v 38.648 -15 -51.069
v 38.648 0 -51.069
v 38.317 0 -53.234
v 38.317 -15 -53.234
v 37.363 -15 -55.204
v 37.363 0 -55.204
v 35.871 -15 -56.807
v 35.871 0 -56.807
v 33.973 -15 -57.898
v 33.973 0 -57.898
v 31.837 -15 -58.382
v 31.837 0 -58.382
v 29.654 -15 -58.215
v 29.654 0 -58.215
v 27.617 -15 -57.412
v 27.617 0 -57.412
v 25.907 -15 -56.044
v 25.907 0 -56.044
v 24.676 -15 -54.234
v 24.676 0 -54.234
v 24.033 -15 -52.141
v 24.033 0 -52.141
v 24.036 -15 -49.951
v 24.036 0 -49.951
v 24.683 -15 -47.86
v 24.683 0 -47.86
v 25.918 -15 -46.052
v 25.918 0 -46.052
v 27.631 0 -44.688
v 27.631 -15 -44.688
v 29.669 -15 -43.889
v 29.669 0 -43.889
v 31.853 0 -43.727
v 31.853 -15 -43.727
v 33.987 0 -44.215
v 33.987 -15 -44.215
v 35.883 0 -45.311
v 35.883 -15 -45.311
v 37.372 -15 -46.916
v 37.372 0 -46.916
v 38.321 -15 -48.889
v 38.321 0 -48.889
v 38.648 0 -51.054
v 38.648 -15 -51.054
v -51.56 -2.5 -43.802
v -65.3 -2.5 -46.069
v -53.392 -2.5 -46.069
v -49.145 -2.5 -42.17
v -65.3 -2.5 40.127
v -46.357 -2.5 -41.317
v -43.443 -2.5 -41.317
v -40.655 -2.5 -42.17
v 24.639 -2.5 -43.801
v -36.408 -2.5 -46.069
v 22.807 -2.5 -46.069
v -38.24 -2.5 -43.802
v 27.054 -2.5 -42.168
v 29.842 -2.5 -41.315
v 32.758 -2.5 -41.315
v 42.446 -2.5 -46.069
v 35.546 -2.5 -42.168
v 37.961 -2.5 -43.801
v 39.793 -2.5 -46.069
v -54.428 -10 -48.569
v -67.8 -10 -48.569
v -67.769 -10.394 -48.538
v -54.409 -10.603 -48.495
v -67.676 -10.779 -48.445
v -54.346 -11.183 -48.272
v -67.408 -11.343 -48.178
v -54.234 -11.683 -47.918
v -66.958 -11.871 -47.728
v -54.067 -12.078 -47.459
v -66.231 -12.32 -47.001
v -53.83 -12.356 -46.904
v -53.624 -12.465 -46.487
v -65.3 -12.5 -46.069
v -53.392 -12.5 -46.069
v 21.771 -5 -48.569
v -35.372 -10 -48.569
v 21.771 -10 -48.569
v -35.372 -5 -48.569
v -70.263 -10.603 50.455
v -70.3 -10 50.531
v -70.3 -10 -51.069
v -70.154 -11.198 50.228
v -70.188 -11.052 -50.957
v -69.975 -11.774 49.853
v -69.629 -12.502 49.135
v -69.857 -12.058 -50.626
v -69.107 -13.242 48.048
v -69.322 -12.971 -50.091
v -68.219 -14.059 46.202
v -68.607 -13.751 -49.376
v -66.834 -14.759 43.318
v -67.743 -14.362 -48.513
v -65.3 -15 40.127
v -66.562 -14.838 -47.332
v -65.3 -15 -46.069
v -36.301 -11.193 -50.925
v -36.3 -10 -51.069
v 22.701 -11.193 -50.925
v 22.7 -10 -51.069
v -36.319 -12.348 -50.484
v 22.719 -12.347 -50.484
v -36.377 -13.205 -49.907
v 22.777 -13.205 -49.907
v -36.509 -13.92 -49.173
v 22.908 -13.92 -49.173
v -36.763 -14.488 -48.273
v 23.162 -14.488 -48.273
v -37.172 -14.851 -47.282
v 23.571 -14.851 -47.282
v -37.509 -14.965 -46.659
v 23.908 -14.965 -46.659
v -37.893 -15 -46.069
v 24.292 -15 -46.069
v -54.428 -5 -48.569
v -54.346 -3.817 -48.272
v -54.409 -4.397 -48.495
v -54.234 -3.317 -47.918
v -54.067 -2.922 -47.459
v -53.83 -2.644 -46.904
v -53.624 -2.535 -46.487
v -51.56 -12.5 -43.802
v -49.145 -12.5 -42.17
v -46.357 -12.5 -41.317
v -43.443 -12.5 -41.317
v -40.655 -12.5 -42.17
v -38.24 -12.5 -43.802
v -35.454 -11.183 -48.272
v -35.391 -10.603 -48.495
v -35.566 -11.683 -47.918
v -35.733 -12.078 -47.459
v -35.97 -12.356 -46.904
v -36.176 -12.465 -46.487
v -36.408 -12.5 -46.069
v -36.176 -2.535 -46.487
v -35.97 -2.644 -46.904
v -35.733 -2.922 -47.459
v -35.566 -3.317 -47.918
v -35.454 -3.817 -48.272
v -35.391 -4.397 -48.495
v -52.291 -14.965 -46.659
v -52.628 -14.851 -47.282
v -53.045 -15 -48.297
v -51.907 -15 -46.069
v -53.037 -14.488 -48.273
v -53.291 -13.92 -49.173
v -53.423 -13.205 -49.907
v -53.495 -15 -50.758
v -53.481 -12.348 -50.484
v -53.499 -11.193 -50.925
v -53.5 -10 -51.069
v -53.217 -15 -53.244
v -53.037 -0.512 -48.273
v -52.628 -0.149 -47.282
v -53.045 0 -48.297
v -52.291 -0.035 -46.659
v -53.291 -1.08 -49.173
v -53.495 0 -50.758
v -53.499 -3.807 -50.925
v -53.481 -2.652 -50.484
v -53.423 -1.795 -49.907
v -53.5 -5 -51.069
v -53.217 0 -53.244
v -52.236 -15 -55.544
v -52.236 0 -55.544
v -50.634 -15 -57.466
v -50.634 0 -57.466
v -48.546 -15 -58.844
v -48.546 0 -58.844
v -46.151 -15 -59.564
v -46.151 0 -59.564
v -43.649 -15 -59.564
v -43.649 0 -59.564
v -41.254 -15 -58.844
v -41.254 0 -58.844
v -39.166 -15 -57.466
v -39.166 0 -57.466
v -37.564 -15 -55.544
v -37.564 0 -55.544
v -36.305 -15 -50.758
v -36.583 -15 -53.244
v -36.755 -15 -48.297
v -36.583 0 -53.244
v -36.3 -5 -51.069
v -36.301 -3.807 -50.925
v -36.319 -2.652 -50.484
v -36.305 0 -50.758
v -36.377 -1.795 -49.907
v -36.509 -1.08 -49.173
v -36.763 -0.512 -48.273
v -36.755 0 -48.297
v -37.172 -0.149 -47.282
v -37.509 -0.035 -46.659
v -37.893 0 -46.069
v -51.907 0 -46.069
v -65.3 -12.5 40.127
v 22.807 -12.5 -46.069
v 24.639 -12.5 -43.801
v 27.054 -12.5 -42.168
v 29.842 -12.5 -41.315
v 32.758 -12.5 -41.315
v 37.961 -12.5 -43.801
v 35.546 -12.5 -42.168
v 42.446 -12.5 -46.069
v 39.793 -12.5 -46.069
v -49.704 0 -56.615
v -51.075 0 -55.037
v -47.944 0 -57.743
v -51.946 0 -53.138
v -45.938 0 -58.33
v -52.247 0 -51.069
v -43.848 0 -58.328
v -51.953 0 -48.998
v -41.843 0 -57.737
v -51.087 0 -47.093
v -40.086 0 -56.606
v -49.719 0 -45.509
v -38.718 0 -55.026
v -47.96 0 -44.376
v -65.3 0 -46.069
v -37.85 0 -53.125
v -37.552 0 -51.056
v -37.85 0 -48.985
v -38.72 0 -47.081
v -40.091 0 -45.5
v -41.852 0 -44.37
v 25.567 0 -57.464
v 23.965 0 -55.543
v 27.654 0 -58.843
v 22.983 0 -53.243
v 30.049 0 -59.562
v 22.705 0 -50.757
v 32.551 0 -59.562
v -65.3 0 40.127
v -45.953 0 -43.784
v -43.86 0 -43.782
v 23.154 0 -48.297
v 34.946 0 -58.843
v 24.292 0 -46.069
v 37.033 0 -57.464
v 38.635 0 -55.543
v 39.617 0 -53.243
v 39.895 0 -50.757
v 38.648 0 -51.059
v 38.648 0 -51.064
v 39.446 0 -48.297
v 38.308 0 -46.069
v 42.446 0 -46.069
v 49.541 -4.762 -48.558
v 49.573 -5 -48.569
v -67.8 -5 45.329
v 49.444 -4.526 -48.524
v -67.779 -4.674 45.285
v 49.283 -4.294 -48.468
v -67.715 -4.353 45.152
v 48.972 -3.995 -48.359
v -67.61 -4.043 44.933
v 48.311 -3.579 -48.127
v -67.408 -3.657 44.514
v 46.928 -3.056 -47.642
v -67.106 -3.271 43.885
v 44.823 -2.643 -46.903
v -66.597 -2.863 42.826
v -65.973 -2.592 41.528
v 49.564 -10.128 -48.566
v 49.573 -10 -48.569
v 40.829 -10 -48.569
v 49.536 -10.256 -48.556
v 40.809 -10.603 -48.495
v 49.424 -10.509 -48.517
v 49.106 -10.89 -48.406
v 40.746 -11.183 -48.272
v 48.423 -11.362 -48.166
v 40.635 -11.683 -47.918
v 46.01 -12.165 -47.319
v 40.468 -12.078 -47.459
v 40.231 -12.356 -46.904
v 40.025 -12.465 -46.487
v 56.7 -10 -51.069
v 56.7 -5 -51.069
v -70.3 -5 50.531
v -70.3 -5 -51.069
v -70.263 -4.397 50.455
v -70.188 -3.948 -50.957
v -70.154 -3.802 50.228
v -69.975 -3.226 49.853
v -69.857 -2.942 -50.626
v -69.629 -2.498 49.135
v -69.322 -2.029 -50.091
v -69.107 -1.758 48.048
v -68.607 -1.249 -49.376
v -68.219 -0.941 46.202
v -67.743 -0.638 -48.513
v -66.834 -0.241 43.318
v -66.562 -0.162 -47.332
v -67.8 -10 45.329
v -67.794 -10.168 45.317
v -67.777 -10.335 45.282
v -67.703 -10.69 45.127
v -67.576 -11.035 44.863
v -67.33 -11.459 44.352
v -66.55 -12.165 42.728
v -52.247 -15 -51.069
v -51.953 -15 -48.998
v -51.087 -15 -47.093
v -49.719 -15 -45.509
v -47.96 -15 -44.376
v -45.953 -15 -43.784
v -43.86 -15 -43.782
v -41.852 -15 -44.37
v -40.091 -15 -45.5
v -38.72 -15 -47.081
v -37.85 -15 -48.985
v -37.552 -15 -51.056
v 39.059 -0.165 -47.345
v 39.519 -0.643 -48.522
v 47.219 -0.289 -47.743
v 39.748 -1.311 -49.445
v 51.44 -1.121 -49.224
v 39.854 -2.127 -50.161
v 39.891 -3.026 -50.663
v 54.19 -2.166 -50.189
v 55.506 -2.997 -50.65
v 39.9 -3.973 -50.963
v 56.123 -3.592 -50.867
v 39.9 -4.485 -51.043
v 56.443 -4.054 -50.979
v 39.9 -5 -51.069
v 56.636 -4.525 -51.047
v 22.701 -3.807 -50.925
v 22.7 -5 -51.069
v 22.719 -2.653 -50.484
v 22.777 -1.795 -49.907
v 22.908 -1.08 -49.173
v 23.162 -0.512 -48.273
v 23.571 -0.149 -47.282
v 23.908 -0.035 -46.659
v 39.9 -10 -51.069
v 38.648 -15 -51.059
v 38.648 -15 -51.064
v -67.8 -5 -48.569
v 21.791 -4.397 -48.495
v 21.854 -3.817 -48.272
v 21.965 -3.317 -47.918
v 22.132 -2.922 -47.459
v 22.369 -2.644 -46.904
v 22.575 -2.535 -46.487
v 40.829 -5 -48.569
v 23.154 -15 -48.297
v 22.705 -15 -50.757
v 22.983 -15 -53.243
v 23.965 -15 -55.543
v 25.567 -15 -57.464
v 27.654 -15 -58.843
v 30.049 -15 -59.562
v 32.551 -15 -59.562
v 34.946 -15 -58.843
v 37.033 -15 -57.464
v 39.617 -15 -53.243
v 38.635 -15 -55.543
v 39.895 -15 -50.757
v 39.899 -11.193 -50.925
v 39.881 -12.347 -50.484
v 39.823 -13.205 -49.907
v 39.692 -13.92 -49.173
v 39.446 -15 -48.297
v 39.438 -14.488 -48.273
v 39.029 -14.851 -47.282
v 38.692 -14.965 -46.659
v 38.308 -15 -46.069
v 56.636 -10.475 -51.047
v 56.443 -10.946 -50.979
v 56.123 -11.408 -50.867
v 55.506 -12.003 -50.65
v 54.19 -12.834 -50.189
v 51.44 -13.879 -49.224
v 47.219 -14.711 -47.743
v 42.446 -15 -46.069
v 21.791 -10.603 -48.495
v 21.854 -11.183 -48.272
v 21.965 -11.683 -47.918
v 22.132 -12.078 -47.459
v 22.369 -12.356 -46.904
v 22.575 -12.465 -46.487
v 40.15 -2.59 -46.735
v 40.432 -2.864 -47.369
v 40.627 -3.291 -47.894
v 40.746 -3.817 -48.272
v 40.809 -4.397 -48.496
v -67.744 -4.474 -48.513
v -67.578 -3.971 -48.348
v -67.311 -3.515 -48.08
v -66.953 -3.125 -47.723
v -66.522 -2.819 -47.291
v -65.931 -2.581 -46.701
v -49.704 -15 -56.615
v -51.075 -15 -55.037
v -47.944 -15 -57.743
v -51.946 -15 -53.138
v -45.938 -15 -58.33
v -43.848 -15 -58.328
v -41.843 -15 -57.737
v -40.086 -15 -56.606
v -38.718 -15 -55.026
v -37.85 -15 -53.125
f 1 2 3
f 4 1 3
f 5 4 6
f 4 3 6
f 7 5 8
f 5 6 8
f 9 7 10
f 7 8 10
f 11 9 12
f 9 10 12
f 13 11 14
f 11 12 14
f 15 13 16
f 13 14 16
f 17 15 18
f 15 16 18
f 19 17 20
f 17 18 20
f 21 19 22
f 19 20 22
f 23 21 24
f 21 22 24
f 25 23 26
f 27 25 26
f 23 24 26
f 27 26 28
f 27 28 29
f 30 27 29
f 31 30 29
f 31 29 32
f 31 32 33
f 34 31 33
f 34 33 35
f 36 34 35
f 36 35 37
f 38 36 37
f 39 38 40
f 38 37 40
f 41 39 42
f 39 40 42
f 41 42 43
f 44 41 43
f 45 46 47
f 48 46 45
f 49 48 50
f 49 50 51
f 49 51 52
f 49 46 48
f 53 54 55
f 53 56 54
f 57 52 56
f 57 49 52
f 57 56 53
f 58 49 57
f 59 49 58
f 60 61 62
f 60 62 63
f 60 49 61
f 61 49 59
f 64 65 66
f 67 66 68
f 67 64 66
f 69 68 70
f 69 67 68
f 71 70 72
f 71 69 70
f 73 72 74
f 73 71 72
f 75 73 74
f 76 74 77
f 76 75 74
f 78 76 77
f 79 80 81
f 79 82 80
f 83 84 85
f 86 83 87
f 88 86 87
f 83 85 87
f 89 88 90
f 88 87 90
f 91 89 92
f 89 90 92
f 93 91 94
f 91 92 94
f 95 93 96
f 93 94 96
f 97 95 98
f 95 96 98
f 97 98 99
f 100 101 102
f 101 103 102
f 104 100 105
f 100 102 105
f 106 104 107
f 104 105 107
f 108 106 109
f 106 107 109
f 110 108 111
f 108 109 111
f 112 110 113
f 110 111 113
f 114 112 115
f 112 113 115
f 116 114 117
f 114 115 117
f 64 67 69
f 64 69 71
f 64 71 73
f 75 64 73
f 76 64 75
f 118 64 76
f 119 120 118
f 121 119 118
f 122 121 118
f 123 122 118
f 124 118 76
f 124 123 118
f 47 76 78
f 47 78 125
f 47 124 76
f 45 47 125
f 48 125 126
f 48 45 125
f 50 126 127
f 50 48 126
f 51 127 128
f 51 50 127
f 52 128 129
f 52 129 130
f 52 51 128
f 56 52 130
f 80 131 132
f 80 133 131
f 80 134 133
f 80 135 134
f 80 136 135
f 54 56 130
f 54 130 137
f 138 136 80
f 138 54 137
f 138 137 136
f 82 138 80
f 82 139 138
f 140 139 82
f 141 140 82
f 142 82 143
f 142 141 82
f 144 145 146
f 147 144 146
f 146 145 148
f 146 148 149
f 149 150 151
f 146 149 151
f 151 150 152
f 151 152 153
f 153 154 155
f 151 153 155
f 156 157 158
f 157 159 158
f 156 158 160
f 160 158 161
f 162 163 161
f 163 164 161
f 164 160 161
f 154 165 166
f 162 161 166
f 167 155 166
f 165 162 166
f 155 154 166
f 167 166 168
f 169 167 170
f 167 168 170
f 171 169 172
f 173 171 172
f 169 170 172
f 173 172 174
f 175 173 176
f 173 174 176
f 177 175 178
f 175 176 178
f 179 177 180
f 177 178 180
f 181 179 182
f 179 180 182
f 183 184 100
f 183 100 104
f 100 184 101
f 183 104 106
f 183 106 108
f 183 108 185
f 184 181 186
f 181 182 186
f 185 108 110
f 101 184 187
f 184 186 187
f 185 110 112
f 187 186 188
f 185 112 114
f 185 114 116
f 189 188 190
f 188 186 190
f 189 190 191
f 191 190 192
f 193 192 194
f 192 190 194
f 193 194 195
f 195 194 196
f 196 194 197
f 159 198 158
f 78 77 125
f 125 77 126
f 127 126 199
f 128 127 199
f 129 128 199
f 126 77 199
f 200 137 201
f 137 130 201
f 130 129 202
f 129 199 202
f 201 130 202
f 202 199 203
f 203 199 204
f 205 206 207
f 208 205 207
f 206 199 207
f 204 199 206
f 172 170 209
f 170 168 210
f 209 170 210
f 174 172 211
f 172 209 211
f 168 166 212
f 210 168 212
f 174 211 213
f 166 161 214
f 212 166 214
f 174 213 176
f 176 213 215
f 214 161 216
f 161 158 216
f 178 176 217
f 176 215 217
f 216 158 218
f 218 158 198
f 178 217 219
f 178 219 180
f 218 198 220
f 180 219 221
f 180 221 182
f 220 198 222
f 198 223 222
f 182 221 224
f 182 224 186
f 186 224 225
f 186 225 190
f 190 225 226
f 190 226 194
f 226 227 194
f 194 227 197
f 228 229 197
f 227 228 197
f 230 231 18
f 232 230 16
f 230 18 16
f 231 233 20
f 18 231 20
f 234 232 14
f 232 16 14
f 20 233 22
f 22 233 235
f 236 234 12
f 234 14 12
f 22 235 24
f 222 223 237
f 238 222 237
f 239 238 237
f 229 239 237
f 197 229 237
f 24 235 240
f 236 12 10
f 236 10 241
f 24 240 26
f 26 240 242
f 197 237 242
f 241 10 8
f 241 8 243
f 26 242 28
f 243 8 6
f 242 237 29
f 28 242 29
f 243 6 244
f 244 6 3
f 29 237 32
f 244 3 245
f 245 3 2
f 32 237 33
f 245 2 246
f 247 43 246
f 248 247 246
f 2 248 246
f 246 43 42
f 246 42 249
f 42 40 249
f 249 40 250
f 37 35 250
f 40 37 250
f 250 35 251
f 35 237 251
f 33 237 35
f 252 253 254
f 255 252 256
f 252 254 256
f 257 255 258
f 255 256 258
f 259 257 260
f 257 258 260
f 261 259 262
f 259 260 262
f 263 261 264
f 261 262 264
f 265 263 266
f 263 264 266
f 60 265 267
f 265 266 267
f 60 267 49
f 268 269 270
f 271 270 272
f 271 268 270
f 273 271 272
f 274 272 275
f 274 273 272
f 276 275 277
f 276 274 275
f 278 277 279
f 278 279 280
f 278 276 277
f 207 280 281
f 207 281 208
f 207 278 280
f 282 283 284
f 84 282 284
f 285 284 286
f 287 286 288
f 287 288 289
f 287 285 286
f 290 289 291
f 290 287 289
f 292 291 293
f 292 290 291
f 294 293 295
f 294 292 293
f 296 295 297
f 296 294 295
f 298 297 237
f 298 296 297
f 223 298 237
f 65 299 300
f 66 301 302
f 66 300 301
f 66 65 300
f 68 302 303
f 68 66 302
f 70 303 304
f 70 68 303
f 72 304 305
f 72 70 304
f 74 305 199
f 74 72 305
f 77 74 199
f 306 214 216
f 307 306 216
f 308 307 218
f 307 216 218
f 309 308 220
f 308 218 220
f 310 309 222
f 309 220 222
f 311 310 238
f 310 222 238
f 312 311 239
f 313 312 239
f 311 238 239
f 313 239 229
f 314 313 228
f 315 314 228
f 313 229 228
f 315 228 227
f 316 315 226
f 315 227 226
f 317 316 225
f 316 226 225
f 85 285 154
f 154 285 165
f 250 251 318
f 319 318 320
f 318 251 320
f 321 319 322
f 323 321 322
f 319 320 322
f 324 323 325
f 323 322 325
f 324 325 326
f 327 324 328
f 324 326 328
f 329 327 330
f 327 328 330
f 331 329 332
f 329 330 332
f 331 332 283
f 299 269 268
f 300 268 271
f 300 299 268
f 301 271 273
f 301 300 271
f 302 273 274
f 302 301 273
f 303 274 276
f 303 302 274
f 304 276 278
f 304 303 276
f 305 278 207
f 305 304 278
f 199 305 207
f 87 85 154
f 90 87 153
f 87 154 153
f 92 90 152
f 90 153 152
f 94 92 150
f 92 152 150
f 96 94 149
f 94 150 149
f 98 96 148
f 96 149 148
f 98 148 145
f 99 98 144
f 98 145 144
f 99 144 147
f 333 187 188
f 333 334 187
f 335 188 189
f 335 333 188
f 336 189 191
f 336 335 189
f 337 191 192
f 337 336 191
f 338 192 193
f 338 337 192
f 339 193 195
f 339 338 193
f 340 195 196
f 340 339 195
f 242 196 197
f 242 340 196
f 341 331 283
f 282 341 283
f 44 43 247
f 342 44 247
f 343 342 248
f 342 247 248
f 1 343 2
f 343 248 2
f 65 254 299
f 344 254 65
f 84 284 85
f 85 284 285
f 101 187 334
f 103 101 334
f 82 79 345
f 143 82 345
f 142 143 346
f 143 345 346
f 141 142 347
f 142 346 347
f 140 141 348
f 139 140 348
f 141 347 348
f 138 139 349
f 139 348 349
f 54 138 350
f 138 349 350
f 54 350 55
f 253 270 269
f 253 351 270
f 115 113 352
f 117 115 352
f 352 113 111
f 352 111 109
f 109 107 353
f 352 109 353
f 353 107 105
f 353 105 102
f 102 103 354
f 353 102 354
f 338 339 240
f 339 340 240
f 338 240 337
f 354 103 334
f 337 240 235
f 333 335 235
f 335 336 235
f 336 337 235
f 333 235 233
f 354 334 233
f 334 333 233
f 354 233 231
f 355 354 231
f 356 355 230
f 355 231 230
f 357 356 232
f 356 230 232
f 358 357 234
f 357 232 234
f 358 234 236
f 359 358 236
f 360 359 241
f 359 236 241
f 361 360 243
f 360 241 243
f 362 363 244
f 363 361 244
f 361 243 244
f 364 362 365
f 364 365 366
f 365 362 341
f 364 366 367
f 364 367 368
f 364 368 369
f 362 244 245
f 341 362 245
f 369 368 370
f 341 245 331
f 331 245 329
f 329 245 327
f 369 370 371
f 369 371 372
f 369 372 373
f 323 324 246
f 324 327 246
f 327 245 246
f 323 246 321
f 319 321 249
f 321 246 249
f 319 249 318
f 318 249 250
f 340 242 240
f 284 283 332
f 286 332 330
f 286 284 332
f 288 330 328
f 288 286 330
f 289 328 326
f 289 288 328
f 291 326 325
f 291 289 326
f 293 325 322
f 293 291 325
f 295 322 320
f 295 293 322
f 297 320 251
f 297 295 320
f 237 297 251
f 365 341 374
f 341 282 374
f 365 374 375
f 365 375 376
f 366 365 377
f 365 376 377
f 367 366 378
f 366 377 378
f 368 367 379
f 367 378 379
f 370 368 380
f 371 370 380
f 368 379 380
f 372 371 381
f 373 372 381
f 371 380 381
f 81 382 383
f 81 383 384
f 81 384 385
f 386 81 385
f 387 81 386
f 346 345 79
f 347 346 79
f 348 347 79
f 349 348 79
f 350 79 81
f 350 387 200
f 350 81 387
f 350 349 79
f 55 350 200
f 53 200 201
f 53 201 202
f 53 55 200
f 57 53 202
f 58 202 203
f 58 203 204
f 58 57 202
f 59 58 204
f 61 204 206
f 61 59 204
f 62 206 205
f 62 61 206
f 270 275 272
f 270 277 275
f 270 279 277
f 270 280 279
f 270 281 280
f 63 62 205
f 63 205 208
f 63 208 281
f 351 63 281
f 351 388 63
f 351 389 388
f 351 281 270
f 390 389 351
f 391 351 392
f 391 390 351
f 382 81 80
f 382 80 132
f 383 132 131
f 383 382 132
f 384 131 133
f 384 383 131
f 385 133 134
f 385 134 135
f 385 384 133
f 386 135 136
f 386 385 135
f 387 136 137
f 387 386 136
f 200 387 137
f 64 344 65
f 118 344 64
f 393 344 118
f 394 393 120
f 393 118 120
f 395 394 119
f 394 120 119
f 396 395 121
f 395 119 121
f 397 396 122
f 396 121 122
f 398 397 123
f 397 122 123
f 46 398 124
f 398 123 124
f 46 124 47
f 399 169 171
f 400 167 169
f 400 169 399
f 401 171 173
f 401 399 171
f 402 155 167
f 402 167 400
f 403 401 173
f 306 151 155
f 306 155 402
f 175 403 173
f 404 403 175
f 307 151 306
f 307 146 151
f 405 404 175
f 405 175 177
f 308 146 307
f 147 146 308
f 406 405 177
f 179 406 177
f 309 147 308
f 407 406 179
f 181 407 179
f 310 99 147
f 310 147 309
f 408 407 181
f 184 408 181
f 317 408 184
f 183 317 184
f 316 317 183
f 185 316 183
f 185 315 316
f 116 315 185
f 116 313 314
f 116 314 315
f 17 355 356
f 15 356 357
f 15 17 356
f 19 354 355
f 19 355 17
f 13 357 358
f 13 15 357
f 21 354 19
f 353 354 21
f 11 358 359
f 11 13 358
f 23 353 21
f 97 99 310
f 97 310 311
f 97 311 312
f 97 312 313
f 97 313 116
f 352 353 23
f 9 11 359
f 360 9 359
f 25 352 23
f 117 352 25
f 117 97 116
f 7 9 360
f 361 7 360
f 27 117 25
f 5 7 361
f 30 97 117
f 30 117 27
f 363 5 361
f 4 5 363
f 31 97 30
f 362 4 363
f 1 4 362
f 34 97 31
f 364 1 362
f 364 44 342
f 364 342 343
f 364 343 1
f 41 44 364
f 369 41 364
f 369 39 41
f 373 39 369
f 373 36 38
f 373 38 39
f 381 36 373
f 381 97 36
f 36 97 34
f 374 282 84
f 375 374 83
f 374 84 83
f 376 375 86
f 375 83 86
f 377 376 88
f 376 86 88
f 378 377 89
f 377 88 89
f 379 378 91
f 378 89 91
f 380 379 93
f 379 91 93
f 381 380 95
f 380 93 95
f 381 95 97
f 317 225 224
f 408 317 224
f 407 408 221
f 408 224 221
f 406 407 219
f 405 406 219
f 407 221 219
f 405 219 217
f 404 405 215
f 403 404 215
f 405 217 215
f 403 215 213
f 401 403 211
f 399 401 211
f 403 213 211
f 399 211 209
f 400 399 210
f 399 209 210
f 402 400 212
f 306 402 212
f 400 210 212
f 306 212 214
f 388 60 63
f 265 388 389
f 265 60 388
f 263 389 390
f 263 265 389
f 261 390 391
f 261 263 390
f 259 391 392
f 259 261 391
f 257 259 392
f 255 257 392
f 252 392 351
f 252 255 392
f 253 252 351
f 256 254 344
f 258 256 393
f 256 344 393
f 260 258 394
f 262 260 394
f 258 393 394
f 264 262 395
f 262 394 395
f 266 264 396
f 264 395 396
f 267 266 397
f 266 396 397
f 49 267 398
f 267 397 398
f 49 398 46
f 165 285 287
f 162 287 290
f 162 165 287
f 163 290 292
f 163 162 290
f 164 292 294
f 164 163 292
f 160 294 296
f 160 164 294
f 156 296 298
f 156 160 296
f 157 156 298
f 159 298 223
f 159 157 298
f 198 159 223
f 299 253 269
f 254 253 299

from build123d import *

# Parameters (mm, degrees)
F1_DEPTH = 15
F2_R     = 5
F3_R     = 5
F4_T     = -2.5


with BuildPart() as f1:
    # F0 (on Front) → F1 (new body)
    with BuildSketch(Plane.XZ):
        with BuildLine():
            Line((56.7000245671, -51.0693943679), (-70.2999754329, 50.5306056321))
            Line((-70.2999754329, 50.5306056321), (-70.2999754329, -51.0693943679))
            Line((-70.2999754329, -51.0693943679), (-53.4999754329, -51.0693943679))
            ThreePointArc((-53.4999754329, -51.0693943679), (-44.8999754329, -42.4693943679), (-36.2999754329, -51.0693943679))
            Line((-36.2999754329, -51.0693943679), (22.7000245671, -51.0693943679))
            ThreePointArc((22.7000245671, -51.0693943679), (31.3000245671, -42.4693943679), (39.9000245671, -51.0693943679))
            Line((39.9000245671, -51.0693943679), (56.7000245671, -51.0693943679))
        make_face()
        with BuildLine():
            ThreePointArc((-36.2999754329, -51.0693943679), (-44.8999754329, -42.4693943679), (-53.4999754329, -51.0693943679))
            ThreePointArc((-53.4999754329, -51.0693943679), (-44.8999754329, -59.6557734847), (-36.2999754329, -51.0693943679))
        make_face()
        with BuildLine():
            ThreePointArc((-37.5524947041, -51.0557626811), (-44.8931595866, -58.4032402486), (-52.2474435165, -51.0693943679))
            ThreePointArc((-52.2474435165, -51.0693943679), (-44.9067912793, -43.7082851136), (-37.5524947041, -51.0557626811))
        make_face(mode=Mode.SUBTRACT)
        with BuildLine():
            ThreePointArc((22.7000245671, -51.0693943679), (31.3000245671, -59.6537478643), (39.9000245671, -51.0693943679))
            ThreePointArc((39.9000245671, -51.0693943679), (31.3000245671, -42.4693943679), (22.7000245671, -51.0693943679))
        make_face()
        with BuildLine():
            ThreePointArc((38.6475245671, -51.053733605), (38.6475203945, -51.0615639909), (38.647507877, -51.0693943679))
            ThreePointArc((38.647507877, -51.0693943679), (23.9525287396, -51.0459032191), (38.6475245671, -51.053733605))
        make_face(mode=Mode.SUBTRACT)
    extrude(amount=F1_DEPTH)

    # F2
    f2_edges = [f1.edges().sort_by_distance(p)[0] for p in [
        (-70.299975, -15, -0.269394),
        (-6.799975, -15, -0.269394),
        (-6.799975, -15, -51.069394),
        (-61.899975, -15, -51.069394),
        (48.300025, -15, -51.069394),
    ]]
    fillet(f2_edges, radius=F2_R)

    # F3
    f3_edges = [f1.edges().sort_by_distance(p)[0] for p in [
        (-6.799975, 0, -0.269394),
        (-6.799975, 0, -51.069394),
        (48.300025, 0, -51.069394),
        (-70.299975, 0, -0.269394),
        (-61.899975, 0, -51.069394),
    ]]
    fillet(f3_edges, radius=F3_R)

    # F4 (hollow: no face is removed)
    offset(amount=F4_T, mode=Mode.SUBTRACT)


solid = f1.part
